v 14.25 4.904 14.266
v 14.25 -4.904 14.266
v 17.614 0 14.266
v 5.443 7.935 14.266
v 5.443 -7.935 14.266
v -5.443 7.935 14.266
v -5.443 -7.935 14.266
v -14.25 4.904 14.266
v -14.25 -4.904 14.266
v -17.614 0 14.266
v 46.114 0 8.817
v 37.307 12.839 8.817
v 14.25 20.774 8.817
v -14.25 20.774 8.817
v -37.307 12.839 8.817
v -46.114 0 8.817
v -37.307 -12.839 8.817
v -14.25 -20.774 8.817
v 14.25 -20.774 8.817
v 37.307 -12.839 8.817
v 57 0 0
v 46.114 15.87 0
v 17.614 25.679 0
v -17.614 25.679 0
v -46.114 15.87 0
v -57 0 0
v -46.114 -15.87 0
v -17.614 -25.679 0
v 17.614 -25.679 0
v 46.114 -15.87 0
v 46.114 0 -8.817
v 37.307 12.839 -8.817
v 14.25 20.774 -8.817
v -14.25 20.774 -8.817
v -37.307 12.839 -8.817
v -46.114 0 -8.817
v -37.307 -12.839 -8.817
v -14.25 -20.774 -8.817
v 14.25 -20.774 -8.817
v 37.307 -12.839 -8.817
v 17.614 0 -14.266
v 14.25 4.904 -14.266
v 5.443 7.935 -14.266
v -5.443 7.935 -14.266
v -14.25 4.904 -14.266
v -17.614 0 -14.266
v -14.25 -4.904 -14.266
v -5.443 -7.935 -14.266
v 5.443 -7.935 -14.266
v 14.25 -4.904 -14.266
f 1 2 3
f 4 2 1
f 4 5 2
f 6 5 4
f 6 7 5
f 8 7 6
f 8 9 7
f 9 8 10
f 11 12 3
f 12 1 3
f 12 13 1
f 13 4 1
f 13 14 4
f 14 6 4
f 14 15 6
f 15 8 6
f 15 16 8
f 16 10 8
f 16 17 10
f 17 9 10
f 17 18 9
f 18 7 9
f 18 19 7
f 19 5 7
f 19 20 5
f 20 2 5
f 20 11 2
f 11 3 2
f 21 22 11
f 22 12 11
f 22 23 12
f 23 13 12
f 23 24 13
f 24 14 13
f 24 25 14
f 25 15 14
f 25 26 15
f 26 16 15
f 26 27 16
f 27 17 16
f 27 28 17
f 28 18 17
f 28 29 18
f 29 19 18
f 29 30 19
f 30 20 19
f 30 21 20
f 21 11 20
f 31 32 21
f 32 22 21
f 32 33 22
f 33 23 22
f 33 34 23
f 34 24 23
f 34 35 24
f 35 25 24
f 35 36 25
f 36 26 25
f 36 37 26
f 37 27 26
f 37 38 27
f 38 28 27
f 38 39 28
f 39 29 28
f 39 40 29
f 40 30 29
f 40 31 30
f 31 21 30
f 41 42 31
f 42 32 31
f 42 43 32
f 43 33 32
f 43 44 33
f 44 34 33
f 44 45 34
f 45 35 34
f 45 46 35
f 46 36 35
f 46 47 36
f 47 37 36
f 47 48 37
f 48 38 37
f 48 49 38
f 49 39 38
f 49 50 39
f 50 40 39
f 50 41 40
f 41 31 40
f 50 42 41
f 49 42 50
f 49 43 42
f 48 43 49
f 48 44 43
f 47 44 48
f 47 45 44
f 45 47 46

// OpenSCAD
// Generated by SolidPython 1.0.1 on 2020-07-29 00:46:53


scale(v = [19, 9, 5]) {
	sphere(r = 3);
}
/***********************************************
*********      SolidPython code:      **********
************************************************
 
# import packages: SolidPython
from solid import *
from solid.utils import *
from itertools import chain, combinations, permutations


class Resize:

    def __init__(self, scad_file):
        self.scad_file = scad_file
        #self.scad_file = import_scad(scad_file)
        # cone/cylinder param:
        self.r1 = 0
        self.r2 = 0
        self.h = 0
        # rectangular prism param:
        self.w = 0
        self.l = 0
        # ellipse param:
        self.r = 0

    # import OpenScad code (file name corresponds to shape)


    # classify shape + parameters
    def assign(self, param1, param2, param3):
        if self.scad_file == 'cone.scad':
            self.r1 = param1
            self.r2 = param2
            self.h = param3
        elif self.scad_file == 'cylinder.scad':
            self.r1 = param1
            self.r2 = param2
            self.h = param3
        elif self.scad_file == 'rectangularPrism.scad':
            self.h = param1
            self.l = param2
            self.w = param3
        else:
            self.r = param1
            self.h = param2

    # resize parameters
    def iterate(self):
        x = range(3, 20, 2)
        i = 1
        if self.scad_file == 'cone.scad':
            tempList = list(permutations(x, 2))
            for temp in tempList:
                param1 = temp[0]
                param2 = temp[1]
                filepath = 'produced_scad_files/' + 'cone' + str(param1) + '_' + str(param2) + '_' + '.scad'
                scad_render_to_file(cylinder(h=param1, r1=param2, r2=0), filepath)

        elif self.scad_file == 'cylinder.scad':
            tempList = list(permutations(x, 3))
            for temp in tempList:
                param1 = temp[0]
                param2 = temp[1]
                filepath = 'produced_scad_files/' + 'cylinder' + str(param1) + '_' + str(param2) + '_' + '.scad'
                scad_render_to_file(cylinder(h=param1, r1=param2, r2=param2), filepath)

        elif self.scad_file == 'rectangularPrism.scad':
            tempList = list(permutations(x, 3))
            for temp in tempList:
                param1 = temp[0]
                param2 = temp[1]
                param3 = temp[2]
                filepath = 'produced_scad_files/' + 'rectangularPrism' + str(param1) + '_' + str(param2) + '_' + str(
                    param3) + '.scad'
                scad_render_to_file(cube(size=(param1, param2, param3)), filepath)

        elif self.scad_file == 'ellipse.scad':
            tempList = list(permutations(x, 4))
            for temp in tempList:
                param1 = temp[0]
                param2 = temp[1]
                param3 = temp[2]
                param4 = temp[3]
                filepath = 'produced_scad_files/' + 'ellipse' + str(param1) + '_' + str(param2) + '_' + str(param3) + '_' + str(param4) + '.scad'
                scad_render_to_file(scale([param1, param2, param3])(sphere(r=param4)), filepath)

    def render_to_scadfile(self):
        scad_render_to_file(scad, 'example.scad') 
 
************************************************/
